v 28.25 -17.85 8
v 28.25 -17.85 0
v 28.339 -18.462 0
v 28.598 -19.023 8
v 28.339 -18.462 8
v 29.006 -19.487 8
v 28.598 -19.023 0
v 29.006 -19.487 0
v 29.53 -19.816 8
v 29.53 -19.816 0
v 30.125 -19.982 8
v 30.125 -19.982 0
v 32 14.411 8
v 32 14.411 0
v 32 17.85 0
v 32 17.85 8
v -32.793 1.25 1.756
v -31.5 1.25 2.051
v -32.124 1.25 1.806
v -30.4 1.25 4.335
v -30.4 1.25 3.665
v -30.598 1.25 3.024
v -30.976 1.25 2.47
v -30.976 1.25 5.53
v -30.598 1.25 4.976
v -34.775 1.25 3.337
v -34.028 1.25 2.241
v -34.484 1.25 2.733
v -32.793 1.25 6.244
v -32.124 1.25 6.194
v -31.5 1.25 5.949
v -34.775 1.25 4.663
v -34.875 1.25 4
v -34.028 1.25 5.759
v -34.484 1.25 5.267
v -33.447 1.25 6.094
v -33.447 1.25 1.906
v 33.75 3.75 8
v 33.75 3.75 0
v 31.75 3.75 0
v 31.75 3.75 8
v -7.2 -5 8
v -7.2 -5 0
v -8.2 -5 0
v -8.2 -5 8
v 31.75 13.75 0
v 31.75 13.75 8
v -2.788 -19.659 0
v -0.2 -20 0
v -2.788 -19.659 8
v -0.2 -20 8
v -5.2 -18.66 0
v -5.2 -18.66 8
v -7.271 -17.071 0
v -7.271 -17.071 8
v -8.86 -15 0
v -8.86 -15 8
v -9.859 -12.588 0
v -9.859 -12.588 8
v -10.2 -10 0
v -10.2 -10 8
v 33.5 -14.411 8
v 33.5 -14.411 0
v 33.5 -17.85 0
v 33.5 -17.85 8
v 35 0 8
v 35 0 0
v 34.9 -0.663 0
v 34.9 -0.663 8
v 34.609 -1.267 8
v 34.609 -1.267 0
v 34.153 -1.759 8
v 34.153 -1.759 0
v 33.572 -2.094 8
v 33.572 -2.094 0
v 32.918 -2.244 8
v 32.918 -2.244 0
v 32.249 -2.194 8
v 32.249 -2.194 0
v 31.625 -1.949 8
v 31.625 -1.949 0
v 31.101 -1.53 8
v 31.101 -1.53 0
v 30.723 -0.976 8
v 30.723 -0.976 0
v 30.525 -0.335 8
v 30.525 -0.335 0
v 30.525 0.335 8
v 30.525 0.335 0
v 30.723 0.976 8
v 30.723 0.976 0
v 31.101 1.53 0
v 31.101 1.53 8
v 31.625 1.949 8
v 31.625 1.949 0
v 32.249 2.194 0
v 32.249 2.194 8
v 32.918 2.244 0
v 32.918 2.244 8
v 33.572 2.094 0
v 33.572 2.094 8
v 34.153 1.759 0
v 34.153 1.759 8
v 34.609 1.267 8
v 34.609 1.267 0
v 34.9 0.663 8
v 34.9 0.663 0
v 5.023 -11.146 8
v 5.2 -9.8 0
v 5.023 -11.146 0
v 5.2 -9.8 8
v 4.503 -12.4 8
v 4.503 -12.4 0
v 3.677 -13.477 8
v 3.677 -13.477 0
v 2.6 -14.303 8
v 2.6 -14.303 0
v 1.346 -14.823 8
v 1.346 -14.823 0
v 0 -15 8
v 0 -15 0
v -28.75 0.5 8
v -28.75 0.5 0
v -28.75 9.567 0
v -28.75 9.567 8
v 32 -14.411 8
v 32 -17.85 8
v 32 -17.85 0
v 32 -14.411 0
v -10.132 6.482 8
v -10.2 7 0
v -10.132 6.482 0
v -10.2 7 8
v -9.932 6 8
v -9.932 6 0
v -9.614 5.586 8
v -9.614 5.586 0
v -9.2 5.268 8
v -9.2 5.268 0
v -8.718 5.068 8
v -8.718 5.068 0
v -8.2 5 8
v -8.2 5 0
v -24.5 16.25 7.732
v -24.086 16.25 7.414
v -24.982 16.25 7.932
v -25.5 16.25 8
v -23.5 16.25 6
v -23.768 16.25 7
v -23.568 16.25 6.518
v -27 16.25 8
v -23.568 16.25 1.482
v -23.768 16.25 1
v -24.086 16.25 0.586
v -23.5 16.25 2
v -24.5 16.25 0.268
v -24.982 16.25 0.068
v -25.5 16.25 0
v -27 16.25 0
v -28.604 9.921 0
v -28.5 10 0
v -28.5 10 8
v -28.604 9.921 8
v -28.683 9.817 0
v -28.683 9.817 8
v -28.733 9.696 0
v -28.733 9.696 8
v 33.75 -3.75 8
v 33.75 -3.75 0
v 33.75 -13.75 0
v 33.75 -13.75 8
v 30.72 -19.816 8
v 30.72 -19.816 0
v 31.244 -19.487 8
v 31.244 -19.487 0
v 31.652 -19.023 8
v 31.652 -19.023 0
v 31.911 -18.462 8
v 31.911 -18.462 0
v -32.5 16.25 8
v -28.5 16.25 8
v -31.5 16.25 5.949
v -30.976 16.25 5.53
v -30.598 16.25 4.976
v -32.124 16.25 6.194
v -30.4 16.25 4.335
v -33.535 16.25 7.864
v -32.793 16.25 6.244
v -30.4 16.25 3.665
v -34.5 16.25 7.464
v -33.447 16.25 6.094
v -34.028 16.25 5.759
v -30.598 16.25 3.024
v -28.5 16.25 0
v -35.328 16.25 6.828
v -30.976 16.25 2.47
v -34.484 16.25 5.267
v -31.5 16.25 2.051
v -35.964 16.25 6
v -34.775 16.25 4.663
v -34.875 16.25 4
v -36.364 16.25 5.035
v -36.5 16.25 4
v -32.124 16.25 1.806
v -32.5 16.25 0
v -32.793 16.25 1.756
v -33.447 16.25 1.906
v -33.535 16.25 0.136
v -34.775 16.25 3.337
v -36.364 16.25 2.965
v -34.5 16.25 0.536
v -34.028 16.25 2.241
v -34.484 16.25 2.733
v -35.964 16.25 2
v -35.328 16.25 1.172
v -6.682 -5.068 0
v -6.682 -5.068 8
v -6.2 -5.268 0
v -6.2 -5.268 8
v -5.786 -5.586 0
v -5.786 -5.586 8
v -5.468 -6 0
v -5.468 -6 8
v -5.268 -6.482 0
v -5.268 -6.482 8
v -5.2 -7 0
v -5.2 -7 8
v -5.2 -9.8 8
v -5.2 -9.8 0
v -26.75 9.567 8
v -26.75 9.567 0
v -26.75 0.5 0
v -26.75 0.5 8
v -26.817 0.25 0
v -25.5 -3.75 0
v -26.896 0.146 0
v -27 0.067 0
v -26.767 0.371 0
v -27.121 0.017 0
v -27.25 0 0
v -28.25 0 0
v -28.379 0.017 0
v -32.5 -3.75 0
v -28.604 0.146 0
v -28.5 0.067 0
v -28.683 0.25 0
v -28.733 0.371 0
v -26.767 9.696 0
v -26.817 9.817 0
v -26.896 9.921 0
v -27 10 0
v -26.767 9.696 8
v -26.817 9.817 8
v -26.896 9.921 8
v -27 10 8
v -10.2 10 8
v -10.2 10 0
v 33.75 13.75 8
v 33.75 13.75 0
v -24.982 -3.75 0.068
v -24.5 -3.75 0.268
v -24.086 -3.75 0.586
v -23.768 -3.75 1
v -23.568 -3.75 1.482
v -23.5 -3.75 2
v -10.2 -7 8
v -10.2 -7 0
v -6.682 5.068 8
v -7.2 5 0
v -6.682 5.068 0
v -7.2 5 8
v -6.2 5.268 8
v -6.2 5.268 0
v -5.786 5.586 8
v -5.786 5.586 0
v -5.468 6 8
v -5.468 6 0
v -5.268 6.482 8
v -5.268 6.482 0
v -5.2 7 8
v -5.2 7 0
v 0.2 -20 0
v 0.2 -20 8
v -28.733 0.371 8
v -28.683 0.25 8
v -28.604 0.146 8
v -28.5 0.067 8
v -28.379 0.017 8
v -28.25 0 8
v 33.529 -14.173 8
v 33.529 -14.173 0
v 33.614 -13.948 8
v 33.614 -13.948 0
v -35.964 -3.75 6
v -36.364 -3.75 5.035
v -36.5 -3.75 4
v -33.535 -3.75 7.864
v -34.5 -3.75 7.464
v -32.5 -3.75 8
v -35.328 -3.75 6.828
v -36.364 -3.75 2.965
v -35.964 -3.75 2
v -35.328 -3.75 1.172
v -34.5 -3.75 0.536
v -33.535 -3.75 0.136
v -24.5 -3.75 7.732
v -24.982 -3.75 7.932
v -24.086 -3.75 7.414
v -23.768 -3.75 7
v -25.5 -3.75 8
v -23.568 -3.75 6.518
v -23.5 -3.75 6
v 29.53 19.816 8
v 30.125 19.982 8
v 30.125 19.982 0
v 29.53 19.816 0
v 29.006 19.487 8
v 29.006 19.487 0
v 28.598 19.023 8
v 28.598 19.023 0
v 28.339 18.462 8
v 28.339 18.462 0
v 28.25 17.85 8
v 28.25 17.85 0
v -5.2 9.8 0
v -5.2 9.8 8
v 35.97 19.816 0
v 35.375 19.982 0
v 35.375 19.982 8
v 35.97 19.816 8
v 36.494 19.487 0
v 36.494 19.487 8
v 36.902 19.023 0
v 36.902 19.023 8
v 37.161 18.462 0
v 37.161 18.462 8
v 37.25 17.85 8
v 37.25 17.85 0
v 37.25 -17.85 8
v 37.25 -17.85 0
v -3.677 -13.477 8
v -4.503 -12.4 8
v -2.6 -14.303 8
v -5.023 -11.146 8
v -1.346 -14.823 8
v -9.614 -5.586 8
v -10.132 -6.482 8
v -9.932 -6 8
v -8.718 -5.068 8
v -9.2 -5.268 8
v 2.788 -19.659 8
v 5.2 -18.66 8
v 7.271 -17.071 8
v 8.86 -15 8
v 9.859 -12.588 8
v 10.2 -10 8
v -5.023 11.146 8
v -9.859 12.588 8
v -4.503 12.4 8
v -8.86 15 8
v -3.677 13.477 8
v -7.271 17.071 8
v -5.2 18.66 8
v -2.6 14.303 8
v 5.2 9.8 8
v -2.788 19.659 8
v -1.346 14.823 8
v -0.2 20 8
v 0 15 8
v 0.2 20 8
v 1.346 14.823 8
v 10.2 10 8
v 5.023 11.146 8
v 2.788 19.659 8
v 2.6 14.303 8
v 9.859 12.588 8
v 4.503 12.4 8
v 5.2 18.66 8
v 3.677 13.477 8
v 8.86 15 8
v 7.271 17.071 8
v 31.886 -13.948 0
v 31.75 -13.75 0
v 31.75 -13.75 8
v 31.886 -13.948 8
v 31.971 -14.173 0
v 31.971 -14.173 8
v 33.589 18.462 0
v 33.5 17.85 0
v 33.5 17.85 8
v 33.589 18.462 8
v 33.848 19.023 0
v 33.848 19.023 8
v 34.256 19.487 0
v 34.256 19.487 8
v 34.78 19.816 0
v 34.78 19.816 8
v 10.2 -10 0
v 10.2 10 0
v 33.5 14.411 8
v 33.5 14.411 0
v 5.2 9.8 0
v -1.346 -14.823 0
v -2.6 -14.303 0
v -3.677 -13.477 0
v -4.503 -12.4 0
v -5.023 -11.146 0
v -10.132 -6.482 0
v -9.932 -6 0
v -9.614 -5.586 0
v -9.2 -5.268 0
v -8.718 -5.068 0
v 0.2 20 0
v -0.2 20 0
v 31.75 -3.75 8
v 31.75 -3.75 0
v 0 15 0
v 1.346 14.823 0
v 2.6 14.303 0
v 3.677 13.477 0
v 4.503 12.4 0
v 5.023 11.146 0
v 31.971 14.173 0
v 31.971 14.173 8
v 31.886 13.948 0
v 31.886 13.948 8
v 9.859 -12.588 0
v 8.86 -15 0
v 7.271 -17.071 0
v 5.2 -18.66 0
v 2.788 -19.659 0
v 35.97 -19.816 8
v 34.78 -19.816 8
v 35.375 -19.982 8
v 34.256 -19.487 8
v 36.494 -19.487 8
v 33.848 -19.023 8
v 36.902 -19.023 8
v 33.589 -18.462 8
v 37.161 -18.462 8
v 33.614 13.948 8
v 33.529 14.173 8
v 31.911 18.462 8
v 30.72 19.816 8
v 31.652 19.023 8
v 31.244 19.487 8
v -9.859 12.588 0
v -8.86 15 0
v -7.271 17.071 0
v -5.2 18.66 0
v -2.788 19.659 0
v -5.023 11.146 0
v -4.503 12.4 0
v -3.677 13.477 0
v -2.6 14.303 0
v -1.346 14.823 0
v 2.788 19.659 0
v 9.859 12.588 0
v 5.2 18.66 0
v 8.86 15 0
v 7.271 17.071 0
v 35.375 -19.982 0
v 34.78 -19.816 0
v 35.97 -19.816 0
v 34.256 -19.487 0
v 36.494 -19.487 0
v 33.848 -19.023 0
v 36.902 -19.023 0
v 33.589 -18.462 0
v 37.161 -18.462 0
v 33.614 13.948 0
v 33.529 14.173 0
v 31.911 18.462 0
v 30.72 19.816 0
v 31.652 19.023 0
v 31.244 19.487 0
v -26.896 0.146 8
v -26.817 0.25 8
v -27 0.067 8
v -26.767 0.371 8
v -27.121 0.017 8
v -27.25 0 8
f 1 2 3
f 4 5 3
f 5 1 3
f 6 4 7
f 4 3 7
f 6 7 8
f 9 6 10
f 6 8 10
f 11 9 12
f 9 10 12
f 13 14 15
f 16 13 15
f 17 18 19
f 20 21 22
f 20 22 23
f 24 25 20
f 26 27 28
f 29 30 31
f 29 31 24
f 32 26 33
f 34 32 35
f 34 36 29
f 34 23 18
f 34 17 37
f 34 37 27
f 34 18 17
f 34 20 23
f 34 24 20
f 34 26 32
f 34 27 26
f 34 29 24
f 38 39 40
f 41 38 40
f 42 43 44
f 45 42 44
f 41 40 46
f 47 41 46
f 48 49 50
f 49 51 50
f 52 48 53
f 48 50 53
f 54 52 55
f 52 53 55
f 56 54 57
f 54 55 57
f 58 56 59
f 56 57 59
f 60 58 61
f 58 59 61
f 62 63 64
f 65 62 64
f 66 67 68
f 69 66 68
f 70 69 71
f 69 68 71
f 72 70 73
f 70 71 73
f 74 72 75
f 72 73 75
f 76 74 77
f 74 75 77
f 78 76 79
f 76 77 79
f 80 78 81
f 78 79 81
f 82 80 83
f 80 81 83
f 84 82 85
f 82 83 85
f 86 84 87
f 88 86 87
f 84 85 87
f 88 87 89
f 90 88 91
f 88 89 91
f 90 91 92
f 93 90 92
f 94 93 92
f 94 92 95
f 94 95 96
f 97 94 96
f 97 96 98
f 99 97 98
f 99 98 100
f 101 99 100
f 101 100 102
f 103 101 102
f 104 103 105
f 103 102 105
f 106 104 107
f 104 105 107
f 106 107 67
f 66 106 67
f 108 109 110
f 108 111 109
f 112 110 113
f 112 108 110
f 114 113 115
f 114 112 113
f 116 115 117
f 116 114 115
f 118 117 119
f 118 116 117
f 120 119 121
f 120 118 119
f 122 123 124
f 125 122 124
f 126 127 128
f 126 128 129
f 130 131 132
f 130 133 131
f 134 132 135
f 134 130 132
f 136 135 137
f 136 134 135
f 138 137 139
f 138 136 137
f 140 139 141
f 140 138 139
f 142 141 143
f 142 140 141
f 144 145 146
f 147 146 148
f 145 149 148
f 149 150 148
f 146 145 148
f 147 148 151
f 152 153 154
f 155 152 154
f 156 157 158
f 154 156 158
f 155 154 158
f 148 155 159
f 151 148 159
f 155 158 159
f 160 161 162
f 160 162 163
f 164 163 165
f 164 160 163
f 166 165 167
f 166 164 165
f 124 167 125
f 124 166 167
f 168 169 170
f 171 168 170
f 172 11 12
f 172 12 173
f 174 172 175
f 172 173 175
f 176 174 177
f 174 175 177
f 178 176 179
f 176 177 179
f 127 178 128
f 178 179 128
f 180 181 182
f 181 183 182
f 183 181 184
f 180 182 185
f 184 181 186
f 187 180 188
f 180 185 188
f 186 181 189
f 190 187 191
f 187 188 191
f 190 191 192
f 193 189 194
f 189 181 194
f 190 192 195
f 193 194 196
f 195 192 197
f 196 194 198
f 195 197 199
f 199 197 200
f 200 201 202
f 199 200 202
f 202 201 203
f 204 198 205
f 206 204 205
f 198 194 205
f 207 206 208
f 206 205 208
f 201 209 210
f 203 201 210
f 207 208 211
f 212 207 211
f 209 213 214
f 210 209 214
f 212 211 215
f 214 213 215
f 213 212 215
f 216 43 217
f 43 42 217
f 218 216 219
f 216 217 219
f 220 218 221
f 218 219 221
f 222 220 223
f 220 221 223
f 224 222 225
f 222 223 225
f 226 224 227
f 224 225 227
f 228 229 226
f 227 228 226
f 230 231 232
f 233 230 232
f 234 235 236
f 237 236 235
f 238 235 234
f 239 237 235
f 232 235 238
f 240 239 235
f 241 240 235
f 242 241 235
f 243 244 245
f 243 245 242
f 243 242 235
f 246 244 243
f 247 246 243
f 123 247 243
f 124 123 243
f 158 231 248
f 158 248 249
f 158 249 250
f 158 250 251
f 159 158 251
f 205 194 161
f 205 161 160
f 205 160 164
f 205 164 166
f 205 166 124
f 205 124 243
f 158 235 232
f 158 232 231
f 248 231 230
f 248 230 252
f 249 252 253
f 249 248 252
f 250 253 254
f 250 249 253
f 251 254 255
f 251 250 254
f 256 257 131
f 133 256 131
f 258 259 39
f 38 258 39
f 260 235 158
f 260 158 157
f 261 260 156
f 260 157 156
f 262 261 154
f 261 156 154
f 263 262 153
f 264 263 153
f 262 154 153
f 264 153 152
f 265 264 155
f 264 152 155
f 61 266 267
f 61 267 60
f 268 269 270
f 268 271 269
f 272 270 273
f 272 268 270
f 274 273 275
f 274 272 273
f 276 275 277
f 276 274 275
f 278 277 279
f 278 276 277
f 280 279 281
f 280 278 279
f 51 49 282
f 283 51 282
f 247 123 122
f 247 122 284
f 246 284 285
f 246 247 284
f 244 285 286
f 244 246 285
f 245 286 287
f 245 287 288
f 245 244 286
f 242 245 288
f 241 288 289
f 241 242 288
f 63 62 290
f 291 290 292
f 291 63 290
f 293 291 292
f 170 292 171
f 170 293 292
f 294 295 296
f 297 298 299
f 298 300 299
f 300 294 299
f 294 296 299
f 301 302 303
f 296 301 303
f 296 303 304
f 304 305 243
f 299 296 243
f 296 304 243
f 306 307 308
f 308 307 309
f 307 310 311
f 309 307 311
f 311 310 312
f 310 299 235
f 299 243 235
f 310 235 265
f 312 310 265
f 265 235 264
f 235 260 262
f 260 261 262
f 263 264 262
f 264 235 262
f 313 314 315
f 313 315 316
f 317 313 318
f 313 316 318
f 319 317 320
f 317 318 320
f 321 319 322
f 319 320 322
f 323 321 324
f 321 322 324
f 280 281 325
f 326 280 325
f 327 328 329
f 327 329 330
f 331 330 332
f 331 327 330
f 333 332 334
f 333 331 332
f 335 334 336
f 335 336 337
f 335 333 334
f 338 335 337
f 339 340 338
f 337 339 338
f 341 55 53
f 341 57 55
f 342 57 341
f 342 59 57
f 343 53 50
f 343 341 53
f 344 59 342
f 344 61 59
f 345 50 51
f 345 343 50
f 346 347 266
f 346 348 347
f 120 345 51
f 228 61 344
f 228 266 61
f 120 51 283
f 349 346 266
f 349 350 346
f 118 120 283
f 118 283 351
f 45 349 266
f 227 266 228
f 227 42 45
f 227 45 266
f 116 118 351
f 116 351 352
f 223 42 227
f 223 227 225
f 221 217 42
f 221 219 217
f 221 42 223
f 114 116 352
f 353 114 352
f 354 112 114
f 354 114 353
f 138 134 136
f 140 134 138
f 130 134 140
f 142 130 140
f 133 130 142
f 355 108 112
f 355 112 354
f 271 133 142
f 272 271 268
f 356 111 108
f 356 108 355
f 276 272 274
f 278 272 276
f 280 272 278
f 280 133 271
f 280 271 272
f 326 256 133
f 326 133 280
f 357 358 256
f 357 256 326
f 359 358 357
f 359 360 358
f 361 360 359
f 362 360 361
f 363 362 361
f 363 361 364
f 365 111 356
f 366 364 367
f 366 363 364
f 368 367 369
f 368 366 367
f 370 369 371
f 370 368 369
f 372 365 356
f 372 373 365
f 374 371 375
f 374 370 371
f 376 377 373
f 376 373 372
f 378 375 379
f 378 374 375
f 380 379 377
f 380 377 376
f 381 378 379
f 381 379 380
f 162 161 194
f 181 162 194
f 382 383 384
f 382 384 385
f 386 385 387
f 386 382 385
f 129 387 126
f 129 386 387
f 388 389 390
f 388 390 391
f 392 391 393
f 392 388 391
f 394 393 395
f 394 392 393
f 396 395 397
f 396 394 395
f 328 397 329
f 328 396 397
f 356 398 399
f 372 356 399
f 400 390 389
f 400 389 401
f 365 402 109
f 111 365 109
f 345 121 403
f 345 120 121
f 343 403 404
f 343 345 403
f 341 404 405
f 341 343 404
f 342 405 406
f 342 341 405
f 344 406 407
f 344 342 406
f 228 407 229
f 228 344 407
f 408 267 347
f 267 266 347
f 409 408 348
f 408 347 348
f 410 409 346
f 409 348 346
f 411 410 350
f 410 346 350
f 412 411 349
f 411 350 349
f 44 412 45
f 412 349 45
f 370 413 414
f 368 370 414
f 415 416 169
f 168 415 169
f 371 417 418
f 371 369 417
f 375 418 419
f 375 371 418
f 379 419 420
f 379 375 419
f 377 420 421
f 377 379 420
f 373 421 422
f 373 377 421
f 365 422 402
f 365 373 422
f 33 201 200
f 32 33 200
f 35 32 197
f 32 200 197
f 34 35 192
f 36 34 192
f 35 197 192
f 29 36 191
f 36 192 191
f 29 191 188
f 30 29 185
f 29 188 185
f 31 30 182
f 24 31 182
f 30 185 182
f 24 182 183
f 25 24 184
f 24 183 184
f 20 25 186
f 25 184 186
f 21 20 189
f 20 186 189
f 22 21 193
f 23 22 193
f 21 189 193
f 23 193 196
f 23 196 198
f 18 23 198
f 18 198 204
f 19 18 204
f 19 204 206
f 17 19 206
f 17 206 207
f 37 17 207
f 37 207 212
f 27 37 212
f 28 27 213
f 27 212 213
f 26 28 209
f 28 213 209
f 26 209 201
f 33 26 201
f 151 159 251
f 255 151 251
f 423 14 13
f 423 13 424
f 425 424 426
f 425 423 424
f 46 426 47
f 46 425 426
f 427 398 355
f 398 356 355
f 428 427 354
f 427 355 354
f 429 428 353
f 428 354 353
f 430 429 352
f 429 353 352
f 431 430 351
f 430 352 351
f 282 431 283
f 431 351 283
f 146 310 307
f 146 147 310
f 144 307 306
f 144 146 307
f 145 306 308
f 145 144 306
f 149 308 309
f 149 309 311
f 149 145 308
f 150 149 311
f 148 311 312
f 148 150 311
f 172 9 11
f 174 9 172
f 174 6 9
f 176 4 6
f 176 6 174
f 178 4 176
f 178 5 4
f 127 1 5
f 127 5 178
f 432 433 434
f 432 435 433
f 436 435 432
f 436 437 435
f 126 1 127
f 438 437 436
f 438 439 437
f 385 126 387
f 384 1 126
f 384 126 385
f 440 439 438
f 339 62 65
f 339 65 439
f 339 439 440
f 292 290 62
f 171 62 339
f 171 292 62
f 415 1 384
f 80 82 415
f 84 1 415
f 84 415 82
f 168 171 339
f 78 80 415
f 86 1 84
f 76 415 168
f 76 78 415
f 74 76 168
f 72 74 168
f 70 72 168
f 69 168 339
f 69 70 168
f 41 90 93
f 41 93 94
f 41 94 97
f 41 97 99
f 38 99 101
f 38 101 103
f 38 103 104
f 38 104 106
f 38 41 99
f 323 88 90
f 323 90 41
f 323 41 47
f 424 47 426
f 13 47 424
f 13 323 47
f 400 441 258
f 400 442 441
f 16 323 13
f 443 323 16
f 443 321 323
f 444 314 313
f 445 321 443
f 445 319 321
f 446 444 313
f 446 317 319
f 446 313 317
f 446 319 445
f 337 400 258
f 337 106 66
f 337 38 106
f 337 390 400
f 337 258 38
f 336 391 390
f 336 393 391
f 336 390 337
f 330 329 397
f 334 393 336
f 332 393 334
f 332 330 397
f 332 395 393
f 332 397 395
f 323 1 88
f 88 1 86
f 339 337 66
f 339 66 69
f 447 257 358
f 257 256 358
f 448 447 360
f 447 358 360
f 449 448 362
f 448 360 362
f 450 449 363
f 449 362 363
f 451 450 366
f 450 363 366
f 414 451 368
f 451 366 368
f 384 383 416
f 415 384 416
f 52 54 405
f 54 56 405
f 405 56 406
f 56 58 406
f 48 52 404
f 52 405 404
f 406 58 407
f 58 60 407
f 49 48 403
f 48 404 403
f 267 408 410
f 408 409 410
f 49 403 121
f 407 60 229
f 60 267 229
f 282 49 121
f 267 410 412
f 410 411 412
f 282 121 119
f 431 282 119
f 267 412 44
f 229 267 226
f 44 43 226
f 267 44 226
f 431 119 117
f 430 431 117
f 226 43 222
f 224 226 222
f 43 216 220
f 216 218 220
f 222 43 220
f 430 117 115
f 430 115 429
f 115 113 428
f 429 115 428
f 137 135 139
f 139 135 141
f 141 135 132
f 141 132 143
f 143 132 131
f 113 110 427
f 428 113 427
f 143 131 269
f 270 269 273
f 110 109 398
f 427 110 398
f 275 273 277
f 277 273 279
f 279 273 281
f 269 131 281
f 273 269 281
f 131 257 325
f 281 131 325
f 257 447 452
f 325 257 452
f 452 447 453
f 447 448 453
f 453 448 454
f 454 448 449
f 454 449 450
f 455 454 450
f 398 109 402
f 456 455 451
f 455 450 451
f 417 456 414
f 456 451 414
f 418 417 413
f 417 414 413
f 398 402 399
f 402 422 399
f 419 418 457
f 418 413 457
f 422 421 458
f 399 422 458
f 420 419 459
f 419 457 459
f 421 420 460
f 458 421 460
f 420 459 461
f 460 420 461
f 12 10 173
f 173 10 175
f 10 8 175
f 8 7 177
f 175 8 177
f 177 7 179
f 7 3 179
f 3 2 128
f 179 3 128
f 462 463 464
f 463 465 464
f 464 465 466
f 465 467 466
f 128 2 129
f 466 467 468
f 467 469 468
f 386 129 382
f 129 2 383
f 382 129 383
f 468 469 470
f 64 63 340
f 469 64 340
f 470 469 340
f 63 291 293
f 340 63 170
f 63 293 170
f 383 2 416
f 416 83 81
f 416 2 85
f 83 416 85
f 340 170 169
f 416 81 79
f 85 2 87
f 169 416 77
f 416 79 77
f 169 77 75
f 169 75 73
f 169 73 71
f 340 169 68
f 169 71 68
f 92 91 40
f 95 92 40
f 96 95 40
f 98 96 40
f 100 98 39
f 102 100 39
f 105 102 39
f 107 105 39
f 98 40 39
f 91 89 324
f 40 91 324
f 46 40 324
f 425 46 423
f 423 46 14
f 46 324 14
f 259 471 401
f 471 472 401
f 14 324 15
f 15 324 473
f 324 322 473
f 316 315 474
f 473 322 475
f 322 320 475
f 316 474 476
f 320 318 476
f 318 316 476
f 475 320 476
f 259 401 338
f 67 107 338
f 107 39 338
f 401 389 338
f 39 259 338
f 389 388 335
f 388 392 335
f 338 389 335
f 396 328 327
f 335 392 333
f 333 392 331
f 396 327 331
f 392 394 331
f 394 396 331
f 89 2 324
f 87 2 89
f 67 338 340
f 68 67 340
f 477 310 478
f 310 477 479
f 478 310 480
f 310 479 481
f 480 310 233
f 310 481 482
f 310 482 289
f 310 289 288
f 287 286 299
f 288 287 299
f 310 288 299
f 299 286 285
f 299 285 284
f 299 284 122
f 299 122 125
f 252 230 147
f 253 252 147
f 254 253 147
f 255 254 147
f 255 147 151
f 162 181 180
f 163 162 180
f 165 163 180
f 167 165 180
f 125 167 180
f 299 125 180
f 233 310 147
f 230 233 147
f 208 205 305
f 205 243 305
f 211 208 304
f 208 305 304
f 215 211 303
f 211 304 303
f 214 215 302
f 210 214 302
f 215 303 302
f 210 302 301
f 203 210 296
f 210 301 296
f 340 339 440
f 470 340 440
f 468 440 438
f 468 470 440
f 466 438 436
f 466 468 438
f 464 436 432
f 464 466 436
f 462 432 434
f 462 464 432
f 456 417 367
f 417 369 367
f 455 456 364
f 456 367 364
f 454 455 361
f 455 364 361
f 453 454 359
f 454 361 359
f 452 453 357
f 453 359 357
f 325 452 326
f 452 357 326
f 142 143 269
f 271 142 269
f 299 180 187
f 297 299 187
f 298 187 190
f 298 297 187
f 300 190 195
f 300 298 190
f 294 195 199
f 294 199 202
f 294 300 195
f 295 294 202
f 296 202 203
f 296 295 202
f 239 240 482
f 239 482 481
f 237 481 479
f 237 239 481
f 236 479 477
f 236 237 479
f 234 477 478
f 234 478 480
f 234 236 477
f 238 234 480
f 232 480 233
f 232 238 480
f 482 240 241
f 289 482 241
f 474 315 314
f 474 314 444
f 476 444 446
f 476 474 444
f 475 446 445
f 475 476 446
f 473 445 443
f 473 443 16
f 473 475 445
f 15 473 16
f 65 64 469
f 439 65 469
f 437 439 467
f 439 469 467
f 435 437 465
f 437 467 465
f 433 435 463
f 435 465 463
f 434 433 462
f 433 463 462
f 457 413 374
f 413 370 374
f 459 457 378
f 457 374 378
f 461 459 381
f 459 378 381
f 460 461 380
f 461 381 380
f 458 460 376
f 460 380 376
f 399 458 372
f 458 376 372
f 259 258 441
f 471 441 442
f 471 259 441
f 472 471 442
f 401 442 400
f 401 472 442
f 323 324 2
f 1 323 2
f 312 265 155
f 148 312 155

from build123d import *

# Parameters (mm, degrees)
F1_DEPTH     = 8
F2_R         = 5.19999
F3_R         = 10
F6_DEPTH     = 8
F7_R         = 2.25
F8_DEPTH     = 8
F9_T1_DEPTH  = 18.75
F10_T1_DEPTH = 11.3071891388
F12_DEPTH    = 8
F13_R        = 2.25
F14_DEPTH    = 15
F15_R        = 3.99999
F16_T1_DEPTH = 8
F17_R        = 2
F17_2_R      = 2


# Not quite as in the source:
# - a fillet or chamfer that OpenCascade refuses, or shapes differently, is made with other operations: its cross-section is extruded or revolved along the edge and cut away or added
# - a fillet or chamfer is up to 0.001 mm smaller than in the source, because OpenCascade refuses the exact size
# - a feature of the source that left no trace in its solid (it failed there, or was rolled back) is left out


with BuildPart() as f1:
    # F0 (on Top) → F1 (new body)
    with BuildSketch(Plane.XY):
        Polygon((-5.2, 15), (5.2, 15), (5.2, -15), (-5.2, -15), (-5.2, -5), (-10.2, -5), (-10.2, -20), (10.2, -20), (10.2, 20), (-10.2, 20), (-10.2, 5), (-5.2, 5), align=None)
    extrude(amount=F1_DEPTH)

    # F2 (radius 5.2 in the source; OpenCascade refuses exactly that, so slightly less here)
    f2_edges = [f1.edges().sort_by_distance(p)[0] for p in [
        (-5.2, 15, 4),
        (5.2, 15, 4),
        (-5.2, -15, 4),
        (5.2, -15, 4),
    ]]
    fillet(f2_edges, radius=F2_R)

    # F3
    f3_edges = [f1.edges().sort_by_distance(p)[0] for p in [
        (-10.2, 20, 4),
        (10.2, 20, 4),
        (10.2, -20, 4),
        (-10.2, -20, 4),
    ]]
    fillet(f3_edges, radius=F3_R)

    # F17#2
    f17_2_edges = [f1.edges().sort_by_distance(p)[0] for p in [
        (-10.2, 5, 4),
        (-5.2, 5, 4),
        (-10.2, -5, 4),
        (-5.2, -5, 4),
    ]]
    fillet(f17_2_edges, radius=F17_2_R)


with BuildPart() as f6:
    # F5 (on Top) → F6 (new body)
    with BuildSketch(Plane.XY):
        Polygon((32, 20), (31.75, 20), (28.25, 20), (28.25, -20), (31.75, -20), (32, -20), (32, -13.75), (31.75, -13.75), (31.75, -3.75), (33.75, -3.75), (33.75, -13.75), (33.5, -13.75), (33.5, -20), (33.75, -20), (37.25, -20), (37.25, 20), (33.75, 20), (33.5, 20), (33.5, 13.75), (33.75, 13.75), (33.75, 3.75), (31.75, 3.75), (31.75, 13.75), (32, 13.75), align=None)
    extrude(amount=F6_DEPTH)

    # F7 (on face) → F8 (cut, through all)
    with BuildSketch(Plane(origin=(0, 0, 0), x_dir=(1, 0, 0), z_dir=(0, 0, -1))):
        with Locations((32.75, 0)):
            Circle(F7_R)
    extrude(amount=-F8_DEPTH, mode=Mode.SUBTRACT)

    # F9: fillet of radius 2.15 on 8 edges, made by hand

    # F9_s2 → F9_t1 (cut)
    with BuildSketch(Plane.XY.offset(-5.375)):
        with BuildLine():
            ThreePointArc((28.25, -17.85), (28.8797204204, -19.3702795796), (30.4, -20))
            Line((30.4, -20), (28.25, -20))
            Line((28.25, -20), (28.25, -17.85))
        make_face()
        with BuildLine():
            ThreePointArc((29.85, -20), (31.3702795796, -19.3702795796), (32, -17.85))
            Line((32, -17.85), (32, -20))
            Line((32, -20), (29.85, -20))
        make_face()
        with BuildLine():
            ThreePointArc((37.25, -17.85), (36.6202795796, -19.3702795796), (35.1, -20))
            Line((35.1, -20), (37.25, -20))
            Line((37.25, -20), (37.25, -17.85))
        make_face()
        with BuildLine():
            ThreePointArc((33.5, -17.85), (34.1297204204, -19.3702795796), (35.65, -20))
            Line((35.65, -20), (33.5, -20))
            Line((33.5, -20), (33.5, -17.85))
        make_face()
        with BuildLine():
            ThreePointArc((35.1, 20), (36.6202795796, 19.3702795796), (37.25, 17.85))
            Line((37.25, 17.85), (37.25, 20))
            Line((37.25, 20), (35.1, 20))
        make_face()
        with BuildLine():
            ThreePointArc((33.5, 17.85), (34.1297204204, 19.3702795796), (35.65, 20))
            Line((35.65, 20), (33.5, 20))
            Line((33.5, 20), (33.5, 17.85))
        make_face()
        with BuildLine():
            ThreePointArc((29.85, 20), (31.3702795796, 19.3702795796), (32, 17.85))
            Line((32, 17.85), (32, 20))
            Line((32, 20), (29.85, 20))
        make_face()
        with BuildLine():
            ThreePointArc((30.4, 20), (28.8797204204, 19.3702795796), (28.25, 17.85))
            Line((28.25, 17.85), (28.25, 20))
            Line((28.25, 20), (30.4, 20))
        make_face()
    extrude(amount=F9_T1_DEPTH, mode=Mode.SUBTRACT)

    # F10: fillet of radius 1 on 4 edges, made by hand

    # F10_s2 → F10_t1 (cut)
    with BuildSketch(Plane.XY.offset(-1.6535945694)):
        with BuildLine():
            ThreePointArc((33.5, -14.4114378278), (33.5645856533, -14.0578844372), (33.75, -13.75))
            Line((33.75, -13.75), (33.5, -13.75))
            Line((33.5, -13.75), (33.5, -14.4114378278))
        make_face()
        with BuildLine():
            ThreePointArc((31.75, -13.75), (31.9354143467, -14.0578844372), (32, -14.4114378278))
            Line((32, -14.4114378278), (32, -13.75))
            Line((32, -13.75), (31.75, -13.75))
        make_face()
        with BuildLine():
            ThreePointArc((32, 14.4114378278), (31.9354143467, 14.0578844372), (31.75, 13.75))
            Line((31.75, 13.75), (32, 13.75))
            Line((32, 13.75), (32, 14.4114378278))
        make_face()
        with BuildLine():
            ThreePointArc((33.75, 13.75), (33.5645856533, 14.0578844372), (33.5, 14.4114378278))
            Line((33.5, 14.4114378278), (33.5, 13.75))
            Line((33.5, 13.75), (33.75, 13.75))
        make_face()
    extrude(amount=F10_T1_DEPTH, mode=Mode.SUBTRACT)


with BuildPart() as f12:
    # F11 (on Top) → F12 (new body)
    with BuildSketch(Plane.XY):
        Polygon((-23.5, -3.75), (-23.5, 16.25), (-27, 16.25), (-27, 10), (-26.75, 10), (-26.75, 0), (-28.75, 0), (-28.75, 10), (-28.5, 10), (-28.5, 16.25), (-36.5, 16.25), (-36.5, -3.75), align=None)
    extrude(amount=F12_DEPTH)

    # F13 (on face) → F14 (cut)
    with BuildSketch(Plane(origin=(0, 16.25, 0), x_dir=(-1, 0, 0), z_dir=(0, 1, 0))):
        with Locations((32.625, 4)):
            Circle(F13_R)
    extrude(amount=-F14_DEPTH, mode=Mode.SUBTRACT)

    # F15 (radius 4 in the source; OpenCascade refuses exactly that, so slightly less here)
    f15_edges = [f12.edges().sort_by_distance(p)[0] for p in [
        (-36.5, 6.25, 8),
        (-36.5, 6.25, 0),
    ]]
    fillet(f15_edges, radius=F15_R)

    # F16: fillet of radius 0.5 on 4 edges, made by hand

    # F16_s2 → F16_t1 (join)
    with BuildSketch(Plane.XY):
        with BuildLine():
            ThreePointArc((-26.75, 9.5669872981), (-26.8169872981, 9.8169872981), (-27, 10))
            Line((-27, 10), (-26.75, 10))
            Line((-26.75, 10), (-26.75, 9.5669872981))
        make_face()
        with BuildLine():
            ThreePointArc((-28.5, 10), (-28.6830127019, 9.8169872981), (-28.75, 9.5669872981))
            Line((-28.75, 9.5669872981), (-28.75, 10))
            Line((-28.75, 10), (-28.5, 10))
        make_face()
        with BuildLine():
            ThreePointArc((-28.75, 0.5), (-28.6035533906, 0.1464466094), (-28.25, 0))
            Line((-28.25, 0), (-28.75, 0))
            Line((-28.75, 0), (-28.75, 0.5))
        make_face()
        with BuildLine():
            ThreePointArc((-27.25, 0), (-26.8964466094, 0.1464466094), (-26.75, 0.5))
            Line((-26.75, 0.5), (-26.75, 0))
            Line((-26.75, 0), (-27.25, 0))
        make_face()
    extrude(amount=F16_T1_DEPTH)

    # F17
    f17_edges = [f12.edges().sort_by_distance(p)[0] for p in [
        (-23.5, 6.25, 8),
        (-23.5, 6.25, 0),
    ]]
    fillet(f17_edges, radius=F17_R)


solid = Compound([f1.part, f6.part, f12.part])
